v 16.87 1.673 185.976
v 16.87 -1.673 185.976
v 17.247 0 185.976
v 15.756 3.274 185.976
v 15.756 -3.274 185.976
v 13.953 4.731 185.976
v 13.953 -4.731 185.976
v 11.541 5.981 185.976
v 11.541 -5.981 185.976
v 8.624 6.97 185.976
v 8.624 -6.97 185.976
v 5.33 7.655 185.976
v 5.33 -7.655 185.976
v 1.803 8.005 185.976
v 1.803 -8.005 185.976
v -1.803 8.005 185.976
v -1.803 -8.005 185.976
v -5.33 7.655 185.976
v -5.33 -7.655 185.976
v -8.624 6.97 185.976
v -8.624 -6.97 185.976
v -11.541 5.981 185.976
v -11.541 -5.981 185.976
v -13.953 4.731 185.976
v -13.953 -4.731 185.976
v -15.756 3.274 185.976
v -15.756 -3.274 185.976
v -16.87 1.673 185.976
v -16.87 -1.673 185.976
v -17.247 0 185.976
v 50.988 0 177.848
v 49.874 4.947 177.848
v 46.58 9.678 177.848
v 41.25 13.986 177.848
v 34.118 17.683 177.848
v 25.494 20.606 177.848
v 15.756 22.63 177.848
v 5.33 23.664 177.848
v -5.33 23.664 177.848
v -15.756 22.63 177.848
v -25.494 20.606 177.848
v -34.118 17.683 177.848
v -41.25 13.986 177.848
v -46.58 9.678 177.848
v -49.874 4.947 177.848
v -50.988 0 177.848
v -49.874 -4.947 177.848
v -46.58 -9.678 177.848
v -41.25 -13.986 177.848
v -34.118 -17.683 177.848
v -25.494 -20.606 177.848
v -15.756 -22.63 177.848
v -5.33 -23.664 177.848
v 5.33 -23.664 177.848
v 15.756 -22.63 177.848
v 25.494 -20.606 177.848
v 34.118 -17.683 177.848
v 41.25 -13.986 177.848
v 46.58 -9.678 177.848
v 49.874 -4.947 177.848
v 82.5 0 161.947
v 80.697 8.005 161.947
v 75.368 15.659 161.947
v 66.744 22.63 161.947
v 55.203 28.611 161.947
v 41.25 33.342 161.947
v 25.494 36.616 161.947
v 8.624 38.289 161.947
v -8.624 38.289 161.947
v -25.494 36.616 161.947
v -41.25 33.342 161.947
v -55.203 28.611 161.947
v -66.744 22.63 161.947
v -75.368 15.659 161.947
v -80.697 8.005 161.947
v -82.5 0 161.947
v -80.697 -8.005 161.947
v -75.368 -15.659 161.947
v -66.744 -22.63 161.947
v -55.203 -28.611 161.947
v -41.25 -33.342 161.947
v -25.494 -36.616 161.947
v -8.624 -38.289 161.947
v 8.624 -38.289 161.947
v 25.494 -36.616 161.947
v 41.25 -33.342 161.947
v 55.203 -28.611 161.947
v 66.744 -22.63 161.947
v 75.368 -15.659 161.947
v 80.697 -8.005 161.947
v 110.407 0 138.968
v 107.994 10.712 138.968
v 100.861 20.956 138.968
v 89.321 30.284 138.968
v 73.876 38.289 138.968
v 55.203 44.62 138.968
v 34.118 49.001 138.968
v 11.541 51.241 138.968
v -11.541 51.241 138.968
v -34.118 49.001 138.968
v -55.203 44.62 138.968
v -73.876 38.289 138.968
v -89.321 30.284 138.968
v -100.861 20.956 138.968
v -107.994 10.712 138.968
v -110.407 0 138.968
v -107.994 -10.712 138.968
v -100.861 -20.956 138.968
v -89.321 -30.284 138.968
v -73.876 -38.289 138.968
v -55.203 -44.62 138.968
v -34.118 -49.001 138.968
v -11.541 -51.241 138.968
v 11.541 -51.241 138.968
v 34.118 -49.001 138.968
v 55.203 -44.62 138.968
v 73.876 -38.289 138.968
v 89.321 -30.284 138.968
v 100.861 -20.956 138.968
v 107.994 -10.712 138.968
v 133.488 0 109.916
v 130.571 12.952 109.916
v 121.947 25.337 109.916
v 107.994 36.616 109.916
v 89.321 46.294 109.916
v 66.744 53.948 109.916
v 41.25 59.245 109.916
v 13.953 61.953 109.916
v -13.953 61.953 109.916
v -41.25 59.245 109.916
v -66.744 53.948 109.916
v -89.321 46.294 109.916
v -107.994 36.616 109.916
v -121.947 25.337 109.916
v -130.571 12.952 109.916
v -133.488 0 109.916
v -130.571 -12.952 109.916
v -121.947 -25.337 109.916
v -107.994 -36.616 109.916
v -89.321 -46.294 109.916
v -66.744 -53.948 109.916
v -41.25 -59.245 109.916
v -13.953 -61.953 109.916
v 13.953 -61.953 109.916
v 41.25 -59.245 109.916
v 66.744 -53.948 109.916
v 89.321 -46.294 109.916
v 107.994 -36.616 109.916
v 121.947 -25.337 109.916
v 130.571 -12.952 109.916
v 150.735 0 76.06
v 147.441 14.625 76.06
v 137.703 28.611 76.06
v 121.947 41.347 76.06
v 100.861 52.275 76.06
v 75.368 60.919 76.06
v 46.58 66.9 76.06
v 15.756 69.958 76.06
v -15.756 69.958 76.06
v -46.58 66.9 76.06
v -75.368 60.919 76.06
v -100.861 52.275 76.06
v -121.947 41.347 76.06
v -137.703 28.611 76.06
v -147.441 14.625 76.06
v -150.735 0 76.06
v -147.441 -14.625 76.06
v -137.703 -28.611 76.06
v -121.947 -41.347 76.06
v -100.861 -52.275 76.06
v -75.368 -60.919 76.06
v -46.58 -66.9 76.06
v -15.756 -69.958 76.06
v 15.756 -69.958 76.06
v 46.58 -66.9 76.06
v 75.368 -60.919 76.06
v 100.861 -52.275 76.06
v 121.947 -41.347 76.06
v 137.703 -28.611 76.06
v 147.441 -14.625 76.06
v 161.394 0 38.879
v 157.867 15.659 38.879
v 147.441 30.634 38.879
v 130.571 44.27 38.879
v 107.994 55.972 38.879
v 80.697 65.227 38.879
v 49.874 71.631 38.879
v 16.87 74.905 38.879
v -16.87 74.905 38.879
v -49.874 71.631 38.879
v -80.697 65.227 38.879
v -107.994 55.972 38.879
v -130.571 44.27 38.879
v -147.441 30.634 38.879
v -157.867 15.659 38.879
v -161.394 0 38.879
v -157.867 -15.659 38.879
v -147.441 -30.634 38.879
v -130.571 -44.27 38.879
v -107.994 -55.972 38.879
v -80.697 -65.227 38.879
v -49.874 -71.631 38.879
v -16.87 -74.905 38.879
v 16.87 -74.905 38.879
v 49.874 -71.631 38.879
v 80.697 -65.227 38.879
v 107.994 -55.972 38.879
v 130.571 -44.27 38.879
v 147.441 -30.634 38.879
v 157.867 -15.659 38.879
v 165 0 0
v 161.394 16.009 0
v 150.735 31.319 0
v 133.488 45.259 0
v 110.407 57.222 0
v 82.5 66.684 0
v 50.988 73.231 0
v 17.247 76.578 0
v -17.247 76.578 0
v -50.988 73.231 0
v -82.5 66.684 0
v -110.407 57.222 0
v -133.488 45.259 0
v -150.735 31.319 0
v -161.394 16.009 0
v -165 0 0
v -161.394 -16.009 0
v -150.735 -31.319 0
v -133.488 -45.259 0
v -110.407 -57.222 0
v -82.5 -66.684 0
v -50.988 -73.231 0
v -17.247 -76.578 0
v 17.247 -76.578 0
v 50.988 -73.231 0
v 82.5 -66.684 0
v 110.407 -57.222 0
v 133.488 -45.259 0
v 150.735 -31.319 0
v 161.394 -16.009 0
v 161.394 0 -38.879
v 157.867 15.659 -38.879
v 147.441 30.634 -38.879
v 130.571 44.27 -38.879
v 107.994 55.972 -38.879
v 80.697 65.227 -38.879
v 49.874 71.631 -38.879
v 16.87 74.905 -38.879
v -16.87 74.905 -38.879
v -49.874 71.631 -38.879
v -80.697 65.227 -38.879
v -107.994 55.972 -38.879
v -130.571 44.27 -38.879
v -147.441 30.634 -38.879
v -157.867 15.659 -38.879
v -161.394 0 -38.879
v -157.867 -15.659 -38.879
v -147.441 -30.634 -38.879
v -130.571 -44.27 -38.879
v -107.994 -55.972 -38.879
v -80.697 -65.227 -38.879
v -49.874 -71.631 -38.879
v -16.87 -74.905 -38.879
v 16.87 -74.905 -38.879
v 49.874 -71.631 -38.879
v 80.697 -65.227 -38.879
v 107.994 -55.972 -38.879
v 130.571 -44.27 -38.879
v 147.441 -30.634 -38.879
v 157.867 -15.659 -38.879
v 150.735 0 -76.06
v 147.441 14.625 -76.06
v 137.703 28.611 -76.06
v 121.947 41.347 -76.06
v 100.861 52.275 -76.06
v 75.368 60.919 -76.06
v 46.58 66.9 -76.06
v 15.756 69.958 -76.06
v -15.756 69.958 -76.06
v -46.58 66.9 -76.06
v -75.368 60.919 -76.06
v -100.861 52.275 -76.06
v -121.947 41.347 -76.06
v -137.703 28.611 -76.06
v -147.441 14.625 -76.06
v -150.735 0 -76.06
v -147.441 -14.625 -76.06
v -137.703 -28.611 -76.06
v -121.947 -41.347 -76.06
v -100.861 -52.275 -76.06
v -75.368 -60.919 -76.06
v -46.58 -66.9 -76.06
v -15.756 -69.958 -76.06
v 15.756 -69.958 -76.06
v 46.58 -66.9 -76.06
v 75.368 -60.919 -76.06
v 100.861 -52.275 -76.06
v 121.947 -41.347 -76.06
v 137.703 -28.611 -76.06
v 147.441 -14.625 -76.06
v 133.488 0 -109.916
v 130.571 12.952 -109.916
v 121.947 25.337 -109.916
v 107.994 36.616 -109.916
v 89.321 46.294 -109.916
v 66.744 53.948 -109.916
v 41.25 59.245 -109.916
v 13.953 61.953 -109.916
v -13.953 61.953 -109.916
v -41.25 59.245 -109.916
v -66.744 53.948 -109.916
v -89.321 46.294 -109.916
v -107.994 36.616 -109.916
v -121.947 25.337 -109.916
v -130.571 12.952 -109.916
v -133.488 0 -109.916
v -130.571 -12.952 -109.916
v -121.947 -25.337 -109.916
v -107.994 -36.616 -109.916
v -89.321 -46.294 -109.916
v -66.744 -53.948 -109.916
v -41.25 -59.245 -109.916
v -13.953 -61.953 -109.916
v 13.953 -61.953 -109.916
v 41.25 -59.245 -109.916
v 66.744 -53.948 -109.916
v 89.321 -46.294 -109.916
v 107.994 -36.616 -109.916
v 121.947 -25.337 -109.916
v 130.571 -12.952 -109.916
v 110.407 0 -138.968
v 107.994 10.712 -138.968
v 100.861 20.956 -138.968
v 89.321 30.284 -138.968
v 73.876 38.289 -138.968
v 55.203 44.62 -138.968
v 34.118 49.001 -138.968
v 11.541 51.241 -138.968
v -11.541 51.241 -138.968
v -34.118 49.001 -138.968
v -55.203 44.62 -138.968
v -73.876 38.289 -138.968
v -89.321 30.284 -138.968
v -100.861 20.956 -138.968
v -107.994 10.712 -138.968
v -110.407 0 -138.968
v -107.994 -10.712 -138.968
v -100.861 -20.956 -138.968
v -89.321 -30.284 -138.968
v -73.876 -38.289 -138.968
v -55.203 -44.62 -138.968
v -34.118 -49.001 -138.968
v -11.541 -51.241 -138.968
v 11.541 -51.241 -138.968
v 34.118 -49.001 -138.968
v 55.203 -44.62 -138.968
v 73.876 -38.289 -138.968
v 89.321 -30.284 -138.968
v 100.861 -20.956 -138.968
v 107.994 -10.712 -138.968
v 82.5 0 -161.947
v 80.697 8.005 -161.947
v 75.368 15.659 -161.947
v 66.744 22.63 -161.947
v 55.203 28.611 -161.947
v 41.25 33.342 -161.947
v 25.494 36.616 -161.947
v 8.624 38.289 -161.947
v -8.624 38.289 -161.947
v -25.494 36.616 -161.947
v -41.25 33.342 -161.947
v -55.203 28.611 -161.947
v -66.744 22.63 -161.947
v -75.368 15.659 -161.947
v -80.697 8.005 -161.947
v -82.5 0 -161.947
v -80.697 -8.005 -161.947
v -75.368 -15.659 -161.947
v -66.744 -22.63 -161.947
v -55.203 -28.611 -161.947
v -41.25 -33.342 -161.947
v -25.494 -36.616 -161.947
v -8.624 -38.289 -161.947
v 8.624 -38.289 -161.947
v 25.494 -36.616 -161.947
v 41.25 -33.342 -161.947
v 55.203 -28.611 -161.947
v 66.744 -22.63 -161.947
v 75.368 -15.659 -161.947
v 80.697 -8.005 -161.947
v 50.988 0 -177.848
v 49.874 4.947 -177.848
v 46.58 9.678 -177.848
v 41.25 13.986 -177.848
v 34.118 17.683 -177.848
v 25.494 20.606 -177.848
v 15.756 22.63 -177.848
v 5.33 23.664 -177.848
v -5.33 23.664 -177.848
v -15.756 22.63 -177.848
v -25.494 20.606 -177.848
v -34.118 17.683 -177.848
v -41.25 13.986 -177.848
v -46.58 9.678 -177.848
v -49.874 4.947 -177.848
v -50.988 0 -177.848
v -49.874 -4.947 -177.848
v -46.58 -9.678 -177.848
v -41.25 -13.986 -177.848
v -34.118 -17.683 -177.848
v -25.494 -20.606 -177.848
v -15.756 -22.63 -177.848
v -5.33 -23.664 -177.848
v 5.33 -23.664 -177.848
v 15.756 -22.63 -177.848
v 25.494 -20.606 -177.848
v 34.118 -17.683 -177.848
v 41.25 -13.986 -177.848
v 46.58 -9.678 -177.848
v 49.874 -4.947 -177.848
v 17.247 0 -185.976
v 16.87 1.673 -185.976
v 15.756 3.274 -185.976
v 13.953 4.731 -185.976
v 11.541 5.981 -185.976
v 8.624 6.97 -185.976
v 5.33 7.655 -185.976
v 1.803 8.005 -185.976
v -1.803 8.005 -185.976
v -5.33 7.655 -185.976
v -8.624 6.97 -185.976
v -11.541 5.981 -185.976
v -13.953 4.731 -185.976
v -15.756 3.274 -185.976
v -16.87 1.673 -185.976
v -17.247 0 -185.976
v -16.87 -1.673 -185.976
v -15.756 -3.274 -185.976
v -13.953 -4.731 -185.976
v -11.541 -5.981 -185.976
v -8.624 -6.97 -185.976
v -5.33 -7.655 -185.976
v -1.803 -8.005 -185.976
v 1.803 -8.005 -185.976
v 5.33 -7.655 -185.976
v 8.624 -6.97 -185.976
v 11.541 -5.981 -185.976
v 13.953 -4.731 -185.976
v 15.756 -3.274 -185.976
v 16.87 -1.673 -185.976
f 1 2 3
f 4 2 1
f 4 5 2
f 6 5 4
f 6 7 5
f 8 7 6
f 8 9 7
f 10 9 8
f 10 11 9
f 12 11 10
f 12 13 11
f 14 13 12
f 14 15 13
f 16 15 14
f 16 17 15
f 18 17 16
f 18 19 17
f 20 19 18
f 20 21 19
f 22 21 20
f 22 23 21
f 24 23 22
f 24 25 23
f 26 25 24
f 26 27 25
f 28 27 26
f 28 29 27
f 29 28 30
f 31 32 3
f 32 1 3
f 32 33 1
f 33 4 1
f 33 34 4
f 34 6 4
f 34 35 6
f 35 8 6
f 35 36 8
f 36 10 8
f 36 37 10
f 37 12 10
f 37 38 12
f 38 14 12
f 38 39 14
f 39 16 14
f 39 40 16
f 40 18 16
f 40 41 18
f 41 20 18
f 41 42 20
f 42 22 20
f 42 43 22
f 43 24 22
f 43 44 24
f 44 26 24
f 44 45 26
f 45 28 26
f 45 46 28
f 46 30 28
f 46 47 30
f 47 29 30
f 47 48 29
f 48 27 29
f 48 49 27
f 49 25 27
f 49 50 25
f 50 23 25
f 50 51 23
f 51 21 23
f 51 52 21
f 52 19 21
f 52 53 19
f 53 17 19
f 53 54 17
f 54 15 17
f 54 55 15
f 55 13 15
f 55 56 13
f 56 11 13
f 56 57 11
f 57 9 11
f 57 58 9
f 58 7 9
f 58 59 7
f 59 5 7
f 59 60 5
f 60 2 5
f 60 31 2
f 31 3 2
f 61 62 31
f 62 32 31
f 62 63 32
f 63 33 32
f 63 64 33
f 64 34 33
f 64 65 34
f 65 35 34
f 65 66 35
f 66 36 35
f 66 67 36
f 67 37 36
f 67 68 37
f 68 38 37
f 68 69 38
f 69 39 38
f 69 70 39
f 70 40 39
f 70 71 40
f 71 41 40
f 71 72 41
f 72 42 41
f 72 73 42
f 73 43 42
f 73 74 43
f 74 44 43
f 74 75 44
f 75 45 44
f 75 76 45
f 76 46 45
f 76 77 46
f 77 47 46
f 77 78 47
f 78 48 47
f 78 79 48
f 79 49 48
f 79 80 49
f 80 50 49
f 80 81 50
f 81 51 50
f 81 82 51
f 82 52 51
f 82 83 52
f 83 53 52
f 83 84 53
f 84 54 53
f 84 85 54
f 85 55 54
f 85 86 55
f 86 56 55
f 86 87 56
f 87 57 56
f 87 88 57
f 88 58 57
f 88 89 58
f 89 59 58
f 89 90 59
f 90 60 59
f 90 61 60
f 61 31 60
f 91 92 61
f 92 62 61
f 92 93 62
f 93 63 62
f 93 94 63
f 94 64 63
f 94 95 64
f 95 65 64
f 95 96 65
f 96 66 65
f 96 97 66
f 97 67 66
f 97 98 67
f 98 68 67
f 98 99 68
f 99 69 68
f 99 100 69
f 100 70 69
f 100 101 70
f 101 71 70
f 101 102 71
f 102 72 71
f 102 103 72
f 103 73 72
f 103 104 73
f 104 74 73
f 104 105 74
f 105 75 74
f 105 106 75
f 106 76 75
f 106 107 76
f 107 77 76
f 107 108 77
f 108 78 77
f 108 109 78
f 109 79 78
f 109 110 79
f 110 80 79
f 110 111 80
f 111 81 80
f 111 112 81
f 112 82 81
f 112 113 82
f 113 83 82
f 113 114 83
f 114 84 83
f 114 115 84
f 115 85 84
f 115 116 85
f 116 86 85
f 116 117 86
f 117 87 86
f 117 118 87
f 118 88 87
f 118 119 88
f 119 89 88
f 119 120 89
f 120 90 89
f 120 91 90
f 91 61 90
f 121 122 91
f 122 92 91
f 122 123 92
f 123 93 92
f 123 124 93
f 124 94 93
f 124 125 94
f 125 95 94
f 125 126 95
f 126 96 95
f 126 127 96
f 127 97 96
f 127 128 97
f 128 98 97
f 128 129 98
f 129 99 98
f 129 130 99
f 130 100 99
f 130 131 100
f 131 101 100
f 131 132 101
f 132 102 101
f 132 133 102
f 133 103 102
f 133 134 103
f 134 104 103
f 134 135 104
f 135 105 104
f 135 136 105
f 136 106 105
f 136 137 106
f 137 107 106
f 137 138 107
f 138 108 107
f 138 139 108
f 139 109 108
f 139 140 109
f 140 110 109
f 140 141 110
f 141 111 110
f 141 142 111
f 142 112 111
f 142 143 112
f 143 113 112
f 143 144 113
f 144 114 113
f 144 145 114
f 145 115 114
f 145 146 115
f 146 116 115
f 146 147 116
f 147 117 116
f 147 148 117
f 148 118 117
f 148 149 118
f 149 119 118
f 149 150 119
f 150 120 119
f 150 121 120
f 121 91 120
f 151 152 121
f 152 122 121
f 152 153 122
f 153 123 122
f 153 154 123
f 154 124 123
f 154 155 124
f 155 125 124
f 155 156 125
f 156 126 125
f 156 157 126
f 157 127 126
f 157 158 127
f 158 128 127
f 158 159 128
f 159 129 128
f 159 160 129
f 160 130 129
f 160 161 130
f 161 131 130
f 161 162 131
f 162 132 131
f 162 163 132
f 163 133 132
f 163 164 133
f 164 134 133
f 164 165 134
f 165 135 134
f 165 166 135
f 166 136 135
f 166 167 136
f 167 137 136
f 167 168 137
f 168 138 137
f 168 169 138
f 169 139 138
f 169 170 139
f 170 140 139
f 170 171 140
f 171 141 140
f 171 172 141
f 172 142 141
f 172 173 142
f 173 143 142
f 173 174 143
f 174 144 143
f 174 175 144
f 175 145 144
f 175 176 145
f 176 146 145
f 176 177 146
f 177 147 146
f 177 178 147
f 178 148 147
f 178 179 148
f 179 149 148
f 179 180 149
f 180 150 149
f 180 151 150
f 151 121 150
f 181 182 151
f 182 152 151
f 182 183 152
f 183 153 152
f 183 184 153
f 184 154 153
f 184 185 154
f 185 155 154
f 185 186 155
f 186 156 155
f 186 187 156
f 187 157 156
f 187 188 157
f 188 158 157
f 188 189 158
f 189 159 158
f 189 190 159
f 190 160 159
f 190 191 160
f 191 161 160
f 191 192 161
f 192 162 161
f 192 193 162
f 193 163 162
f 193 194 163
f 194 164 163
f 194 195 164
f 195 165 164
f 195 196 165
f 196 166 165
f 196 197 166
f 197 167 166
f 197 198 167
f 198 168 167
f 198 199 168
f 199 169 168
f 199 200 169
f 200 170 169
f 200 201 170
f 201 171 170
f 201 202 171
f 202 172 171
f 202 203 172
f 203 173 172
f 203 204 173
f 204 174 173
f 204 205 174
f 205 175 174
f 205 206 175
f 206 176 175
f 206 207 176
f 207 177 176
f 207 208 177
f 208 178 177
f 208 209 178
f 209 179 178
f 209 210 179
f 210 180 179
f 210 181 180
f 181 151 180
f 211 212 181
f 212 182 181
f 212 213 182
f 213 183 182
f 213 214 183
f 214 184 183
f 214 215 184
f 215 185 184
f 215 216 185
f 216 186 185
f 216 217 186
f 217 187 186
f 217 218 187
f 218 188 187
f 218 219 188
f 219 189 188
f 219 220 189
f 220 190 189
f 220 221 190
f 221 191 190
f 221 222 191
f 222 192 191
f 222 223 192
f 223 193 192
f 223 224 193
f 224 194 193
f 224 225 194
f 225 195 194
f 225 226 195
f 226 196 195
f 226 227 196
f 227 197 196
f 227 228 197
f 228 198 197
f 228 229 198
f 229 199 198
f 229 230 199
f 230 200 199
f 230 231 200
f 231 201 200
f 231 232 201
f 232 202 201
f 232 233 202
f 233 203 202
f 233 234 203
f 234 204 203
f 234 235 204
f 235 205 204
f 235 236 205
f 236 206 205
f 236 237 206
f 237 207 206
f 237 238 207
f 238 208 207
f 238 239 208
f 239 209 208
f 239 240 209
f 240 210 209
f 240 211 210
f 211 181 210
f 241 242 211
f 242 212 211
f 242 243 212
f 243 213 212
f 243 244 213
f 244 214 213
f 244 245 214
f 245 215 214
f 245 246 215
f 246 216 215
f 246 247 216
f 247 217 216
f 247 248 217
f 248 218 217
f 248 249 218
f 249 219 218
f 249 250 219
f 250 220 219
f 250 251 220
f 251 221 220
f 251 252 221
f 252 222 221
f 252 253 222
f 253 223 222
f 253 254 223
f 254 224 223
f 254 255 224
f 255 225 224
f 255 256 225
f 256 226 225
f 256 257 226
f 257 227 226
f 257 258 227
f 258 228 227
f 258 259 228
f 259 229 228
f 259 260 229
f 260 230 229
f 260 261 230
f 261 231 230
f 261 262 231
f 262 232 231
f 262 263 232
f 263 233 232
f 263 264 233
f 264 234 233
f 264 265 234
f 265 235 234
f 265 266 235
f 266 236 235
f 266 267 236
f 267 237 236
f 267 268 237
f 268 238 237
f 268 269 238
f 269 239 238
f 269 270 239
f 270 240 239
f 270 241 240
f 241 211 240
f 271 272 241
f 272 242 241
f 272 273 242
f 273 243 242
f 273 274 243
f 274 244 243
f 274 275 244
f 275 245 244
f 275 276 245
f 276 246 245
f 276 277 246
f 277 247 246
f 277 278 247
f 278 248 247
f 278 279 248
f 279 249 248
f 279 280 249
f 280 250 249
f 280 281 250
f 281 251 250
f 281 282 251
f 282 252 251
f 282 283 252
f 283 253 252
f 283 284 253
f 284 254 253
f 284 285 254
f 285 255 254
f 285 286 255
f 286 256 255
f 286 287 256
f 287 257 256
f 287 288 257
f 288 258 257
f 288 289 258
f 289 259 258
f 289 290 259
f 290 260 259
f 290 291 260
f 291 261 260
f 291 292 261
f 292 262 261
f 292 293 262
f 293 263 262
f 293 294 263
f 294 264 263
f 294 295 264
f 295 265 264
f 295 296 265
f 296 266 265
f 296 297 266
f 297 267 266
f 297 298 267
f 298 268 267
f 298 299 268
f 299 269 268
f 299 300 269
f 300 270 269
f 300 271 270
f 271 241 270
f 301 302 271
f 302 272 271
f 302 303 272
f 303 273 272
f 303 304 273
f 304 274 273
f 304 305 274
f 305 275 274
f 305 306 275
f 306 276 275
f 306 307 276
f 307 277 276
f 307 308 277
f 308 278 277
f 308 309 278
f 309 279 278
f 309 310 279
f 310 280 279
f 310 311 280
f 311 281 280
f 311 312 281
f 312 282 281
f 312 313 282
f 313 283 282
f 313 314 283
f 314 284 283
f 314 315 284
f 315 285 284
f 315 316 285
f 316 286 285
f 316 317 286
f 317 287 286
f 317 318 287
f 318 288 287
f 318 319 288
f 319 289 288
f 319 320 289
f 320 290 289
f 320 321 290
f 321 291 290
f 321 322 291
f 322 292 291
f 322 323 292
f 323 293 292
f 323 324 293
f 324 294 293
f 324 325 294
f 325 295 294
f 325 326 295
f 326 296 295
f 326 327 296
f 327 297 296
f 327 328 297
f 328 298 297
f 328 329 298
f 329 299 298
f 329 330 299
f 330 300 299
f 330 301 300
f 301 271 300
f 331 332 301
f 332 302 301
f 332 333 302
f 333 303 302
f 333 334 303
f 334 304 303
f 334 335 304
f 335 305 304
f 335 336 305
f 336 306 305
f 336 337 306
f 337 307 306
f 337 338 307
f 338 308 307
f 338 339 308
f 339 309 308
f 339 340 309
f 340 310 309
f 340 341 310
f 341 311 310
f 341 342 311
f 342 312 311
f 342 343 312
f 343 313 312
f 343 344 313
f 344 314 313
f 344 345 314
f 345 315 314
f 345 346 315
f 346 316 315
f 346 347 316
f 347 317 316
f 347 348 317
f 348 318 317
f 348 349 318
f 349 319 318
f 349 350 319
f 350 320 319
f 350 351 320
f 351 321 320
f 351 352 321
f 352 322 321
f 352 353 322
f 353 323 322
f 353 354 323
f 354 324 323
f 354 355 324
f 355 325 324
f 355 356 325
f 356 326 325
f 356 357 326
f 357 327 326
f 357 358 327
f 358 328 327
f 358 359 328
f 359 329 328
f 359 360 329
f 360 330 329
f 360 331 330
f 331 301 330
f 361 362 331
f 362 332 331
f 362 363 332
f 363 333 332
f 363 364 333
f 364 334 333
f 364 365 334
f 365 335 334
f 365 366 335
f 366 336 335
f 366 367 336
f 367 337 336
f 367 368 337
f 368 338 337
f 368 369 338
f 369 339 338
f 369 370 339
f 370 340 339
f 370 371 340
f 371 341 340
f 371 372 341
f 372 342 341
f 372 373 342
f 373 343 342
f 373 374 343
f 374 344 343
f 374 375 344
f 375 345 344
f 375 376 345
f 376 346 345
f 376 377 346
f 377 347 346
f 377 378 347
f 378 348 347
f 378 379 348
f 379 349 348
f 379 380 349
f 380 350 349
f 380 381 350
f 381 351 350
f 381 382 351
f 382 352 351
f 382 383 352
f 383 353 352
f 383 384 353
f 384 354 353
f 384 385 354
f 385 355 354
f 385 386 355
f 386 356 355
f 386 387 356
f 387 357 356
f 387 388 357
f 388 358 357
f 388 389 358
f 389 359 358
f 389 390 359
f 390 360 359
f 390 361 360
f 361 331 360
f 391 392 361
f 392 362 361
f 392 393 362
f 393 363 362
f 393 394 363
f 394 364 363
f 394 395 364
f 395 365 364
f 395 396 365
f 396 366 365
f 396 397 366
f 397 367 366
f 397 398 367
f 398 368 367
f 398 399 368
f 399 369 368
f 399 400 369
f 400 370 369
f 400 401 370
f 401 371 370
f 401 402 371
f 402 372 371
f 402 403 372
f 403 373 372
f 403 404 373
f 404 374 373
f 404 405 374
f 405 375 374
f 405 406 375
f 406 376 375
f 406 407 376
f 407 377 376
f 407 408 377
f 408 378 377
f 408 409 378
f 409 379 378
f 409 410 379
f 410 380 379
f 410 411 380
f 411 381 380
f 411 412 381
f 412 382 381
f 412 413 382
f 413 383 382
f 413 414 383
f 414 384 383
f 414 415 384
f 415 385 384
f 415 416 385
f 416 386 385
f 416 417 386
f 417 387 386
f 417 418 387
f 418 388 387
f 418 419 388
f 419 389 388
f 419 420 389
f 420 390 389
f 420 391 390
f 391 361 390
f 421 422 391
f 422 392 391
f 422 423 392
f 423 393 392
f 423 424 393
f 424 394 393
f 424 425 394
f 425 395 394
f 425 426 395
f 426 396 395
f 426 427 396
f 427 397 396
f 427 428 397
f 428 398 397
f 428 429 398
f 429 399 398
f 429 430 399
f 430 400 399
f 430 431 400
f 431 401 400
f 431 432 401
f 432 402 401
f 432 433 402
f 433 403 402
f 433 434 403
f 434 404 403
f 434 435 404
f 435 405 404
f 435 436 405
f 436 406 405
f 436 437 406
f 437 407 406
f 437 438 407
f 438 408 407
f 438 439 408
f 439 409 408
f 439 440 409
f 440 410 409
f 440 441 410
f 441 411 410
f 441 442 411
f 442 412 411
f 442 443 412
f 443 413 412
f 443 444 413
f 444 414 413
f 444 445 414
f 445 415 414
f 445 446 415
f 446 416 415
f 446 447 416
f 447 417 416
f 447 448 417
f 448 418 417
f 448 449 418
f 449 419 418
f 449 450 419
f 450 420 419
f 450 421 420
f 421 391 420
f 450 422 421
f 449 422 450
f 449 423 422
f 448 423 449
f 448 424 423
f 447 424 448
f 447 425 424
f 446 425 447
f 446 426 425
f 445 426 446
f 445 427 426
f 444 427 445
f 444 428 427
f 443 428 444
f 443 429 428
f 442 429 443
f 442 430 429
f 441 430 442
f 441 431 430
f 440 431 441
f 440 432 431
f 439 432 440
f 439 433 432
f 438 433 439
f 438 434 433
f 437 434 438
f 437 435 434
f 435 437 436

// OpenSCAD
// Generated by SolidPython 1.0.1 on 2020-07-29 00:46:51


scale(v = [15, 7, 17]) {
	sphere(r = 11);
}
/***********************************************
*********      SolidPython code:      **********
************************************************
 
# import packages: SolidPython
from solid import *
from solid.utils import *
from itertools import chain, combinations, permutations


class Resize:

    def __init__(self, scad_file):
        self.scad_file = scad_file
        #self.scad_file = import_scad(scad_file)
        # cone/cylinder param:
        self.r1 = 0
        self.r2 = 0
        self.h = 0
        # rectangular prism param:
        self.w = 0
        self.l = 0
        # ellipse param:
        self.r = 0

    # import OpenScad code (file name corresponds to shape)


    # classify shape + parameters
    def assign(self, param1, param2, param3):
        if self.scad_file == 'cone.scad':
            self.r1 = param1
            self.r2 = param2
            self.h = param3
        elif self.scad_file == 'cylinder.scad':
            self.r1 = param1
            self.r2 = param2
            self.h = param3
        elif self.scad_file == 'rectangularPrism.scad':
            self.h = param1
            self.l = param2
            self.w = param3
        else:
            self.r = param1
            self.h = param2

    # resize parameters
    def iterate(self):
        x = range(3, 20, 2)
        i = 1
        if self.scad_file == 'cone.scad':
            tempList = list(permutations(x, 2))
            for temp in tempList:
                param1 = temp[0]
                param2 = temp[1]
                filepath = 'produced_scad_files/' + 'cone' + str(param1) + '_' + str(param2) + '_' + '.scad'
                scad_render_to_file(cylinder(h=param1, r1=param2, r2=0), filepath)

        elif self.scad_file == 'cylinder.scad':
            tempList = list(permutations(x, 3))
            for temp in tempList:
                param1 = temp[0]
                param2 = temp[1]
                filepath = 'produced_scad_files/' + 'cylinder' + str(param1) + '_' + str(param2) + '_' + '.scad'
                scad_render_to_file(cylinder(h=param1, r1=param2, r2=param2), filepath)

        elif self.scad_file == 'rectangularPrism.scad':
            tempList = list(permutations(x, 3))
            for temp in tempList:
                param1 = temp[0]
                param2 = temp[1]
                param3 = temp[2]
                filepath = 'produced_scad_files/' + 'rectangularPrism' + str(param1) + '_' + str(param2) + '_' + str(
                    param3) + '.scad'
                scad_render_to_file(cube(size=(param1, param2, param3)), filepath)

        elif self.scad_file == 'ellipse.scad':
            tempList = list(permutations(x, 4))
            for temp in tempList:
                param1 = temp[0]
                param2 = temp[1]
                param3 = temp[2]
                param4 = temp[3]
                filepath = 'produced_scad_files/' + 'ellipse' + str(param1) + '_' + str(param2) + '_' + str(param3) + '_' + str(param4) + '.scad'
                scad_render_to_file(scale([param1, param2, param3])(sphere(r=param4)), filepath)

    def render_to_scadfile(self):
        scad_render_to_file(scad, 'example.scad') 
 
************************************************/
